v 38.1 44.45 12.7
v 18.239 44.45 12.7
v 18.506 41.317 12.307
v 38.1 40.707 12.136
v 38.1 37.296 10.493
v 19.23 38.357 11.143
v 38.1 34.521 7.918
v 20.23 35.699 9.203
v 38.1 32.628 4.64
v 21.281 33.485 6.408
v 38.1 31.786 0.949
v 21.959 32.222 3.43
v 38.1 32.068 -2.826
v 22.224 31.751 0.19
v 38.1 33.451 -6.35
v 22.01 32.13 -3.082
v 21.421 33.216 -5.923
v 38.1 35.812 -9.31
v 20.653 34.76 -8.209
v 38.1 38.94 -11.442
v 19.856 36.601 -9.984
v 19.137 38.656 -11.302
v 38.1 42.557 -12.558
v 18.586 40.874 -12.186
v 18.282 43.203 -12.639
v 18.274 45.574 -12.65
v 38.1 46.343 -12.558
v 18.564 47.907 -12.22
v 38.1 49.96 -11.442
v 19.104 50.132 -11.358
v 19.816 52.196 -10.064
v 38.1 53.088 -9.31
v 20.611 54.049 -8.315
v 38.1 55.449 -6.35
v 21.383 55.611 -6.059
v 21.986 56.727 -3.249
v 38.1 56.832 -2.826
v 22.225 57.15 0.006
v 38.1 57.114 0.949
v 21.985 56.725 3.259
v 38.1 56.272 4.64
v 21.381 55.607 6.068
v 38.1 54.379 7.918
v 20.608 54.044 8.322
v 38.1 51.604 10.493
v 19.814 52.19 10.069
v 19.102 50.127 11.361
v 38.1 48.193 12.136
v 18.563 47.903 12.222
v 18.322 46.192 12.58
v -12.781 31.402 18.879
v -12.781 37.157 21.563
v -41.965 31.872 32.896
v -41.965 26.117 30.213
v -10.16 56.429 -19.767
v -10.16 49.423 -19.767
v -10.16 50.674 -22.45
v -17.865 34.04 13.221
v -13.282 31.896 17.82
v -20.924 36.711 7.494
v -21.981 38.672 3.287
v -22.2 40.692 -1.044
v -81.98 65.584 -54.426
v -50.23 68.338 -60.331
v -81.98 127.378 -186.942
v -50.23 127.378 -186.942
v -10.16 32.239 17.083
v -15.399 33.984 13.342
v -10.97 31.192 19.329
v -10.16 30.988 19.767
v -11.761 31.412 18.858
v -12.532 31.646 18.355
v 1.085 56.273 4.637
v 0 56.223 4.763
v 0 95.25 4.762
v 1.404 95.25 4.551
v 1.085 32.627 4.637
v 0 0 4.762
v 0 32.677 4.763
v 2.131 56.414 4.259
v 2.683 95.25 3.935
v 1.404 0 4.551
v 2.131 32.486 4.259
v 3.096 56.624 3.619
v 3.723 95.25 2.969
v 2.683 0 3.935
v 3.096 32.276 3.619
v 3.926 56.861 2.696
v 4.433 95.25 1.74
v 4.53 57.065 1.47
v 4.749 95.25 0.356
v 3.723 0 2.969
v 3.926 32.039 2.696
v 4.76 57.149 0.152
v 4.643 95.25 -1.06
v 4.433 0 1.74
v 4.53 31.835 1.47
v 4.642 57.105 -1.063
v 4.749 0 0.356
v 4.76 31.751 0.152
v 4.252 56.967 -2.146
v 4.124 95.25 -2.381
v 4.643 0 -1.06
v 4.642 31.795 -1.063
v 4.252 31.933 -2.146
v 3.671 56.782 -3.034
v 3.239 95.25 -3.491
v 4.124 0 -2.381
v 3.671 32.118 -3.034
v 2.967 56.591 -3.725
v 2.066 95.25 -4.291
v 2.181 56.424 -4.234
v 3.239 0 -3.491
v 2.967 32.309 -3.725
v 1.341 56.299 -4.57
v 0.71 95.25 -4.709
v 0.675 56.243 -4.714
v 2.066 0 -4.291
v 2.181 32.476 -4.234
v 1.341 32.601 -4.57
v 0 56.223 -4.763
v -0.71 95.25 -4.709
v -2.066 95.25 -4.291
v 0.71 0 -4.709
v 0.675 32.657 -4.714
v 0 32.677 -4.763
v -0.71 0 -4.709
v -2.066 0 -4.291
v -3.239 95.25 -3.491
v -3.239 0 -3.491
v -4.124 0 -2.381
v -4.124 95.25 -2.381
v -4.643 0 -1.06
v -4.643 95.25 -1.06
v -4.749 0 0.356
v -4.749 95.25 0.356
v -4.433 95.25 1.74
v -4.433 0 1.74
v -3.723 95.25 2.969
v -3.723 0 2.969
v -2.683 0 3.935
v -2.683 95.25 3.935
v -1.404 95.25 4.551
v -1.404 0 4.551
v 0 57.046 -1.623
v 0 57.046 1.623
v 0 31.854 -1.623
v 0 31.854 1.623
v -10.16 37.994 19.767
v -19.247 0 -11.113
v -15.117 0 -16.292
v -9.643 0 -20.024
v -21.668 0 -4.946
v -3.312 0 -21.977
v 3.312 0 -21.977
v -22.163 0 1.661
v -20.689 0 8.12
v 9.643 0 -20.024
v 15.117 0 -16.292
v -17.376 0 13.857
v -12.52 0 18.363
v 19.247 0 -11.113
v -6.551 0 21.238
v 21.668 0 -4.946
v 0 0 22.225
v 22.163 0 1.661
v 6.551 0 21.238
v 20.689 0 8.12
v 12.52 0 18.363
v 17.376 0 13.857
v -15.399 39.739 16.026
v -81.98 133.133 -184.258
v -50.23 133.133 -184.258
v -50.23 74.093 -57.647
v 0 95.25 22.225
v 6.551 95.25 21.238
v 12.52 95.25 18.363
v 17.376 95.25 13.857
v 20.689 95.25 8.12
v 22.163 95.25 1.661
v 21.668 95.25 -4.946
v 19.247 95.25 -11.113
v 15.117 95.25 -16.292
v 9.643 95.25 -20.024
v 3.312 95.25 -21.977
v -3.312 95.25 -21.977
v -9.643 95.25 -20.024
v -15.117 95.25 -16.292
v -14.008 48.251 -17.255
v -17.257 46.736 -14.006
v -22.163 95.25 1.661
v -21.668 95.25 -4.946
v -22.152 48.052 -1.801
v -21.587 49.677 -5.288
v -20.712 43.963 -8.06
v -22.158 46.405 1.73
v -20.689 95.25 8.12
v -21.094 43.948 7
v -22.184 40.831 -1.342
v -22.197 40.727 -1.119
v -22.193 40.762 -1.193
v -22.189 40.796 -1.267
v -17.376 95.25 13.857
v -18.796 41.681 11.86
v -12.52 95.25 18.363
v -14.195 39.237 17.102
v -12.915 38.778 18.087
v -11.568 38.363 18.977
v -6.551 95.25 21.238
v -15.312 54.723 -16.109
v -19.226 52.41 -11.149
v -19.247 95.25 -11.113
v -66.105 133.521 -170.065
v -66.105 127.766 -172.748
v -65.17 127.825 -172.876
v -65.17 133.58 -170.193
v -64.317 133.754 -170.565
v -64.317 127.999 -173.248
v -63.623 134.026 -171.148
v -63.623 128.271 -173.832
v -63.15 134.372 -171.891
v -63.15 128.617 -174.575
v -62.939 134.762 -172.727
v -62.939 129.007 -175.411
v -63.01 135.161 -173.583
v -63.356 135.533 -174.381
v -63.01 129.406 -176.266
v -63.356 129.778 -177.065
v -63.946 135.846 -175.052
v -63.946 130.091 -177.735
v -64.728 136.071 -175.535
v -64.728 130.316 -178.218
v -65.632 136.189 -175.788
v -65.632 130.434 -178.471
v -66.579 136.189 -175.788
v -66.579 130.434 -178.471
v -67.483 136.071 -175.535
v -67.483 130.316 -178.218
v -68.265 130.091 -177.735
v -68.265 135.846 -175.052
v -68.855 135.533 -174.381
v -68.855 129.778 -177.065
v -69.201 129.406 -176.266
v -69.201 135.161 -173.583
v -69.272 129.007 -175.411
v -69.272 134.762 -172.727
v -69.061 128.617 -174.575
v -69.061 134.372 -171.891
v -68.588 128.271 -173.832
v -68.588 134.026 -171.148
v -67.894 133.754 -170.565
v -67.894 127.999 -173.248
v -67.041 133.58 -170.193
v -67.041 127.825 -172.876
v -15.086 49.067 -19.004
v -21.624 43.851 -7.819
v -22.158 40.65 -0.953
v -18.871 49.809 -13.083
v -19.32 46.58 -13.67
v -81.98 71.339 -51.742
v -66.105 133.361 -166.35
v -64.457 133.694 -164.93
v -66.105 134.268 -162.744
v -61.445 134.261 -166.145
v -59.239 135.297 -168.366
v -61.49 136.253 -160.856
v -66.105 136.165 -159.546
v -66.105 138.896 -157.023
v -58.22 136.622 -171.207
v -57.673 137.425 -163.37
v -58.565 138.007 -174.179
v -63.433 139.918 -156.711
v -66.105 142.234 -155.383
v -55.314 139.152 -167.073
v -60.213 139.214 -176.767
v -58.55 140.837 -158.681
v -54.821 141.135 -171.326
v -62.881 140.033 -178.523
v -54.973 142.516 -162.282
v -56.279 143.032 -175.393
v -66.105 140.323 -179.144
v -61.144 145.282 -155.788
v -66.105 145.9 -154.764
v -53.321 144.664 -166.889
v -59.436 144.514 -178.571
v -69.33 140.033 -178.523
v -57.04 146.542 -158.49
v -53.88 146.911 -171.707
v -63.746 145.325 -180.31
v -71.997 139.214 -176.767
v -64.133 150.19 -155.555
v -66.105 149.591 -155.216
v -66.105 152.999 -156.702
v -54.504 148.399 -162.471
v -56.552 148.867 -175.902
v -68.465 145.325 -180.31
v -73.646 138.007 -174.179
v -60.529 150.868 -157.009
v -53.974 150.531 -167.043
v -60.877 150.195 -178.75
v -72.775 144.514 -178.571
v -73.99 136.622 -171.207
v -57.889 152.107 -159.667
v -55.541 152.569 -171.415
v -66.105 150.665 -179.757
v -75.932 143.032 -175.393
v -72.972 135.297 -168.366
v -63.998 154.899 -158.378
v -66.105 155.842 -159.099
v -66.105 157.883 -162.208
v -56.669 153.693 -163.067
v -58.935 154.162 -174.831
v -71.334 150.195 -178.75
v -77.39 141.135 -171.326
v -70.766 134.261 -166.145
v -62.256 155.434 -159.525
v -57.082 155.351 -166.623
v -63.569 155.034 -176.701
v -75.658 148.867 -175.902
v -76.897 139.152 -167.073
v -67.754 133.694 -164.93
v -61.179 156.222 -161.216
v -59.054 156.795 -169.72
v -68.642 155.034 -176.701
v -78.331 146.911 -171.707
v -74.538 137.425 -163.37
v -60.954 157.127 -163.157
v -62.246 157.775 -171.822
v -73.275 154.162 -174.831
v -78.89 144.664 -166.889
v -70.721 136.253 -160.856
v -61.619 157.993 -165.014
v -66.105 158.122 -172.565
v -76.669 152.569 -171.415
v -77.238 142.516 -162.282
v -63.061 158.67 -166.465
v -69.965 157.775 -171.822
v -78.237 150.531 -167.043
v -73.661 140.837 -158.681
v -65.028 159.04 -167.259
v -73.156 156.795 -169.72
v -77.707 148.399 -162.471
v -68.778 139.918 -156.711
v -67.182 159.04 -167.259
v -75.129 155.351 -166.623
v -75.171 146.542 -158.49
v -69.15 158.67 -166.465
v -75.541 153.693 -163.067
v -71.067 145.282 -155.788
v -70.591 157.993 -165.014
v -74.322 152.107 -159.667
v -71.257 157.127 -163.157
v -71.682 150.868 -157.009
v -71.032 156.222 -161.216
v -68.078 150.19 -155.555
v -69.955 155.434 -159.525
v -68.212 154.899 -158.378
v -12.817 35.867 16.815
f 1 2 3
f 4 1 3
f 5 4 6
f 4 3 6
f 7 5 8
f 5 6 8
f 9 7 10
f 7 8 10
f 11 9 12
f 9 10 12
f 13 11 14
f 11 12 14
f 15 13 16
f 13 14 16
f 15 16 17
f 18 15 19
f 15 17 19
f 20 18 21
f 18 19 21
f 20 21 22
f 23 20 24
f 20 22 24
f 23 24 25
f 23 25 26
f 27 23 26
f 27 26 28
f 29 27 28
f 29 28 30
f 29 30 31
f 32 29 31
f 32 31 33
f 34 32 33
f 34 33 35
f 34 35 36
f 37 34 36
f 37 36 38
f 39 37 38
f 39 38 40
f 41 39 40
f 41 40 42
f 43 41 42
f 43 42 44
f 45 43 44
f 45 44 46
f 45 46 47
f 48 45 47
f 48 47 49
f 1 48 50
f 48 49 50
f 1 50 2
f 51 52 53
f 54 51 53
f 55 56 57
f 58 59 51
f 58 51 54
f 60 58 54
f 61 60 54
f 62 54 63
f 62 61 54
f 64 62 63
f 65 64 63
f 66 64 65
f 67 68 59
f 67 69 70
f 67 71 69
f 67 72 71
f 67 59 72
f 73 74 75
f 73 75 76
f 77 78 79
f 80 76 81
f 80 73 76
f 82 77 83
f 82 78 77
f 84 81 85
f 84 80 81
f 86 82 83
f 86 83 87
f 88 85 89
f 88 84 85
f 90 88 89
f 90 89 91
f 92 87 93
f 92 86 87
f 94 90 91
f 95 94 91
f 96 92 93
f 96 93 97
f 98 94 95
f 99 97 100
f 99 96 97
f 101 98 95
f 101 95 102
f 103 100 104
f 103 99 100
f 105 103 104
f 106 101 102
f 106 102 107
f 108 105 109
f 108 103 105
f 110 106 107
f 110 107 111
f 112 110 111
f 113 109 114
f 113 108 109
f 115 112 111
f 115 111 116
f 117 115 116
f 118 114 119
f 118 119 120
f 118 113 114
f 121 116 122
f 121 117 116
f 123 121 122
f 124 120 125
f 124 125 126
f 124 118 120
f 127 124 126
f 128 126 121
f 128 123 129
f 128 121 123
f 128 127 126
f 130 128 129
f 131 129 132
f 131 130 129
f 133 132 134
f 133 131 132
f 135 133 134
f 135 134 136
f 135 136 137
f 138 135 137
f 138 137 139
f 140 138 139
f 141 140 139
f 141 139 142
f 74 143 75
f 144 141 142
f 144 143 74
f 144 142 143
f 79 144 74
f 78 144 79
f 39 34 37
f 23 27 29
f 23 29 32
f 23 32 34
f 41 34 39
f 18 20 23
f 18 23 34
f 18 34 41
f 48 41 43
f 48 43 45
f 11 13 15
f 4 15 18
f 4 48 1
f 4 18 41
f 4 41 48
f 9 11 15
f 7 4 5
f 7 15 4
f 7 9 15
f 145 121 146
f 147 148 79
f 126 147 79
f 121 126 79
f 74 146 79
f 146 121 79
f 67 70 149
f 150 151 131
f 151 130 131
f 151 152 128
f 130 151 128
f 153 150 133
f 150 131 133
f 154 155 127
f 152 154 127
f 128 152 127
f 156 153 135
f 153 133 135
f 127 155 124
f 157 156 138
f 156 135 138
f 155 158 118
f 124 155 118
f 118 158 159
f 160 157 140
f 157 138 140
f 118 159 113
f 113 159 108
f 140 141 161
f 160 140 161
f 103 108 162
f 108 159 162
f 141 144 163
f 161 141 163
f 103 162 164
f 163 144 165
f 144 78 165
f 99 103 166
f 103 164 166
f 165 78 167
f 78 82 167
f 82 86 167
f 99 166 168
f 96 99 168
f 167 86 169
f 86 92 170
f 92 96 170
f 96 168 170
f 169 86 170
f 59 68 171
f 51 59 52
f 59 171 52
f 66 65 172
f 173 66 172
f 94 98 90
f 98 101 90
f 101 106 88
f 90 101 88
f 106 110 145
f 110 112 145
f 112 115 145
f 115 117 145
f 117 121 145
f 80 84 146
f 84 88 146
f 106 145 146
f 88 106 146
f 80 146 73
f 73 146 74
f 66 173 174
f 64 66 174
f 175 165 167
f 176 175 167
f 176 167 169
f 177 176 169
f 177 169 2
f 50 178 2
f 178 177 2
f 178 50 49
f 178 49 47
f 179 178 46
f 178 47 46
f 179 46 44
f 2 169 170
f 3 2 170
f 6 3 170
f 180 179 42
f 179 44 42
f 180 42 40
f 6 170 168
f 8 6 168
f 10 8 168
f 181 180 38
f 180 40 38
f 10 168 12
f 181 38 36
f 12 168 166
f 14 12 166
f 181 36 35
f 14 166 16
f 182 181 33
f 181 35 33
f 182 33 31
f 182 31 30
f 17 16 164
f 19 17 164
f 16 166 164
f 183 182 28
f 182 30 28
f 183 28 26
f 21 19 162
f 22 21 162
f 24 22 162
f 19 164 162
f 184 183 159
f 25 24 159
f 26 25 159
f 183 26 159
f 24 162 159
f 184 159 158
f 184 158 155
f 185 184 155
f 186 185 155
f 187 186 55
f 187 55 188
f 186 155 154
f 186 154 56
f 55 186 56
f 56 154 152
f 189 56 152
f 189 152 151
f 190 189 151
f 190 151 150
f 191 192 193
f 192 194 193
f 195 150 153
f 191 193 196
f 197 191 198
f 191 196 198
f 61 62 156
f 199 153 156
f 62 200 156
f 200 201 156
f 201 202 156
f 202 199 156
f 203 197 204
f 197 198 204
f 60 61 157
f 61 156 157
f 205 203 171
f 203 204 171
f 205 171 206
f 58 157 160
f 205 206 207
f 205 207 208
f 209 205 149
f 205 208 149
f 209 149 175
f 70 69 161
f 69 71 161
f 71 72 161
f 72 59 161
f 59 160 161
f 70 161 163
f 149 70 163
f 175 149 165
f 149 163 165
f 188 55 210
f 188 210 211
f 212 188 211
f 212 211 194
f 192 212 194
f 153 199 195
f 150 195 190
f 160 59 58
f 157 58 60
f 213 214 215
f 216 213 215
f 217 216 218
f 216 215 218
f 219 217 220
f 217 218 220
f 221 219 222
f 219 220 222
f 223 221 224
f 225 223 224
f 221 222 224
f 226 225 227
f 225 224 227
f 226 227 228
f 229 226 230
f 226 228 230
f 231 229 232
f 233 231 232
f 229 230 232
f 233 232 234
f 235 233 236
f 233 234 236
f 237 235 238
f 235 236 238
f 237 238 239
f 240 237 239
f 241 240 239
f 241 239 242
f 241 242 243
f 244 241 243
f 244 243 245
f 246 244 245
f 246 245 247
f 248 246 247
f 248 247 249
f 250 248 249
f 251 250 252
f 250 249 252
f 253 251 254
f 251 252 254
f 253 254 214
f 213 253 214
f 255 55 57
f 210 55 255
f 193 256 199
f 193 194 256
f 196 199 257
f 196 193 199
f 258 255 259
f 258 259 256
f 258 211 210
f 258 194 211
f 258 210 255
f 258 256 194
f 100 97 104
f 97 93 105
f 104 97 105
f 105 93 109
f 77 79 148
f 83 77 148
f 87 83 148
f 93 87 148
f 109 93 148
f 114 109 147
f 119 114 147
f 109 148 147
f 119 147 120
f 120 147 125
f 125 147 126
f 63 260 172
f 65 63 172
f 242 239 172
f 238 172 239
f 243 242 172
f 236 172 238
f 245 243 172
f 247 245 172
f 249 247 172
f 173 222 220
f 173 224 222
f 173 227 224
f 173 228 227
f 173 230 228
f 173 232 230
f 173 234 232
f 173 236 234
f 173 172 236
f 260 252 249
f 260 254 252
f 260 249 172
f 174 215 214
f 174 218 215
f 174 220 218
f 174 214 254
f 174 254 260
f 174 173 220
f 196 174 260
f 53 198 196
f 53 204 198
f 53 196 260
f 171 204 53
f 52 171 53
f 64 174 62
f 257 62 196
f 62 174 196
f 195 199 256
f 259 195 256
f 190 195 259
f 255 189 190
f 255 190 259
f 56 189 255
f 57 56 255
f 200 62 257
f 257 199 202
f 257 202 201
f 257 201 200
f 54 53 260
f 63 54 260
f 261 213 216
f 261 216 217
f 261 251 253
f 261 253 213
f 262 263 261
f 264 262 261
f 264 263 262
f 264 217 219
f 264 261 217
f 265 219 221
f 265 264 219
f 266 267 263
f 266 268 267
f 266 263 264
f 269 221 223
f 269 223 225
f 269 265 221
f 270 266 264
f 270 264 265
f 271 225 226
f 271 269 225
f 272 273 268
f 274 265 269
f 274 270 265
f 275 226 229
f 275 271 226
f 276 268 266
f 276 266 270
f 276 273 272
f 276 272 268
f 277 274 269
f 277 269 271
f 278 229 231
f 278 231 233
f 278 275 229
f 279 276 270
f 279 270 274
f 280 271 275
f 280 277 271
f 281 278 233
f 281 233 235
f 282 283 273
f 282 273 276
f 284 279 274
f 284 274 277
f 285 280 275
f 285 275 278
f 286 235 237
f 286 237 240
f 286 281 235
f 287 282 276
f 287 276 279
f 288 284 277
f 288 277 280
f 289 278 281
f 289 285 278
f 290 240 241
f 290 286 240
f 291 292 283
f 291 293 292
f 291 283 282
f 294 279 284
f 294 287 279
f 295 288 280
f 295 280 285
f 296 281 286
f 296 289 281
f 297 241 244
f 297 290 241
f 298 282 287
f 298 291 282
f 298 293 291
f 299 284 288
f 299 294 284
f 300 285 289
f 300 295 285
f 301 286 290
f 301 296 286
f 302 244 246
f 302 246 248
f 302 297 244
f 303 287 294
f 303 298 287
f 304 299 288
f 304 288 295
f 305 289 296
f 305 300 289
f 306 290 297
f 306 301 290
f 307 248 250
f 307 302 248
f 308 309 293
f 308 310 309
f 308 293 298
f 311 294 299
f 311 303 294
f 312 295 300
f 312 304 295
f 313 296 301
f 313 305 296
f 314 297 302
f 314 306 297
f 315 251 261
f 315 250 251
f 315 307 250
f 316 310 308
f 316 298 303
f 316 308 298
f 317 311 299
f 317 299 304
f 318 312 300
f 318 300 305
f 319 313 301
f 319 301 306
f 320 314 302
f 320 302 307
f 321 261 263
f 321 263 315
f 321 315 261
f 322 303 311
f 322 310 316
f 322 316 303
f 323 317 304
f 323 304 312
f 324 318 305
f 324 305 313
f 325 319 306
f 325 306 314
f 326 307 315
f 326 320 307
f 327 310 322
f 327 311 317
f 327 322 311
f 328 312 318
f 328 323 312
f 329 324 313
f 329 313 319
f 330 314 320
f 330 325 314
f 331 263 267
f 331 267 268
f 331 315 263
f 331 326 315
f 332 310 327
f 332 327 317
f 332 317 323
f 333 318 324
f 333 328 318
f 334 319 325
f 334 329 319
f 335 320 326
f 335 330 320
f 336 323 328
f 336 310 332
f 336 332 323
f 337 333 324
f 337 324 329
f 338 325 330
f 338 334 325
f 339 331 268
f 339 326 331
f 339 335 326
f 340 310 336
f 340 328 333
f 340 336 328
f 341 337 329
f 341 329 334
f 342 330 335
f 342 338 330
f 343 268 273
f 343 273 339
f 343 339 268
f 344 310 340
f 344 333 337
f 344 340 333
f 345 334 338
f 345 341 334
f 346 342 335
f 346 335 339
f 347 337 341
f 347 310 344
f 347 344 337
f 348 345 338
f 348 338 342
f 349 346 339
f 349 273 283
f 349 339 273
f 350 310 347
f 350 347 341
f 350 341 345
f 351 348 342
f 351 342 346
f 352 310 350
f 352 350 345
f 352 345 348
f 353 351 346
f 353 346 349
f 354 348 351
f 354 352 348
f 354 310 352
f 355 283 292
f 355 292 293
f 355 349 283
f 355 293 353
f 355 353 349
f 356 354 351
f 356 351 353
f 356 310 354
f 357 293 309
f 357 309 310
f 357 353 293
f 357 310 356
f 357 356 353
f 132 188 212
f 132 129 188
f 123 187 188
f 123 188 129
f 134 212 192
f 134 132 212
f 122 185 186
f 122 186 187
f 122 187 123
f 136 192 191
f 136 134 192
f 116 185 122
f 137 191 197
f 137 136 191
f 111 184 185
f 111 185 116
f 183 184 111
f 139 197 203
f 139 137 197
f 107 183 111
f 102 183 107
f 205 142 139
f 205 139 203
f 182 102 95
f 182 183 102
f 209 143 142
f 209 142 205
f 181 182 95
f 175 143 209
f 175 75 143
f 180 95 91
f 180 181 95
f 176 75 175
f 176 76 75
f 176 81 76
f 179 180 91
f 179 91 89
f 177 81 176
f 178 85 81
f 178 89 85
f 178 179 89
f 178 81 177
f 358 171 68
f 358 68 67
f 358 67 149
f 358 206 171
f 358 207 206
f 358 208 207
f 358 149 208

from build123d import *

# Parameters (mm, degrees)
SKETCH1_R           = 22.225
SKETCH1_R_2         = 4.7625
BOSS_EXTRUDE1_DEPTH = 95.25
SKETCH2_R           = 12.7
BOSS_EXTRUDE2_DEPTH = 38.1
BOSS_EXTRUDE3_START = -10.16
BOSS_EXTRUDE3_DEPTH = 101.6
CUT_EXTRUDE1_DEPTH  = 6.35
SKETCH5_R           = 3.175
BOSS_EXTRUDE4_DEPTH = 6.35
DOME1_FACE_RADIUS   = 3.175
DOME1_HEIGHT        = 25.4


with BuildPart() as part:
    # Sketch1 → Boss-Extrude1 (new body)
    with BuildSketch(Plane(origin=(0, 0, 0), x_dir=(1, 0, 0), z_dir=(0, 1, 0))):
        with Locations(Location((0, 0, 0), (0, 0, 270))):
            Circle(SKETCH1_R)
        with Locations(Location((0, 0, 0), (0, 0, 270))):
            Circle(SKETCH1_R_2, mode=Mode.SUBTRACT)
    extrude(amount=BOSS_EXTRUDE1_DEPTH)

    # Sketch2 → Boss-Extrude2 (add)
    with BuildSketch(Plane(origin=(0, 0, 0), x_dir=(0, 0, -1), z_dir=(1, 0, 0))):
        with Locations(Location((0, 44.45, 0), (0, 0, 180))):
            Circle(SKETCH2_R)
    extrude(amount=BOSS_EXTRUDE2_DEPTH)

    # Sketch3 → Boss-Extrude3 (add)
    with BuildSketch(Plane(origin=(0, 0, 0), x_dir=(0, 0, -1), z_dir=(1, 0, 0)).offset(BOSS_EXTRUDE3_START)):
        Polygon((-34.433625962, 31.155054448), (-31.75, 25.4), (186.942069012, 127.377786558), (184.25844305, 133.132841006), align=None)
    extrude(amount=-BOSS_EXTRUDE3_DEPTH)

    # Sketch4 → Cut-Extrude1 (cut)
    with BuildSketch(Plane(origin=(0, 38.779412625, 18.083137086), x_dir=(1, 0, 0), z_dir=(0, 0.9063077870366493, 0.42261826174070105))):
        with BuildLine():
            Line((-41.964599748, -16.344444393), (-81.980400092, 77.043433422))
            Line((-81.980400092, 77.043433422), (-81.980400092, 223.25923161))
            Line((-81.980400092, 223.25923161), (-111.76, 223.25923161))
            Line((-111.76, 223.25923161), (-111.76, -18.04076839))
            Line((-111.76, -18.04076839), (-10.16, -18.04076839))
            Line((-10.16, -18.04076839), (-10.16, -1.857678602))
            add(Edge.make_bspline(
                [(-15.398693032, 2.269861536), (-13.053103619, -0.216913648), (-10.16, -1.857678602)],
                knots=[5.477258717, 5.477258717, 5.477258717, 5.808405234, 5.808405234, 5.808405234], degree=2, weights=[0.860760797, 0.917991521, 1]))
            Line((-15.398693032, 2.269861536), (-12.78088793, -3.839506786))
            Line((-12.78088793, -3.839506786), (-41.964599748, -16.344444393))
        make_face()
        with BuildLine():
            Line((-10.16, 223.25923161), (-50.230400092, 223.25923161))
            Line((-50.230400092, 223.25923161), (-50.230400092, 83.55923161))
            Line((-50.230400092, 83.55923161), (-22.157554012, 18.043522888))
            add(Edge.make_bspline(
                [(-10.16, 41.762746934), (-23.308412463, 34.30589187), (-22.157554012, 18.043522888)],
                knots=[3.616372727, 3.616372727, 3.616372727, 4.782388845, 4.782388845, 4.782388845], degree=2, weights=[1, 0.711235953, 0.729678603]))
            Line((-10.16, 41.762746934), (-10.16, 223.25923161))
        make_face()
    extrude(amount=-CUT_EXTRUDE1_DEPTH, mode=Mode.SUBTRACT)

    # Sketch5 → Boss-Extrude4 (add)
    with BuildSketch(Plane(origin=(0, 38.779412625, 18.083137086), x_dir=(1, 0, 0), z_dir=(0, 0.906307787036649, 0.4226182617407014))):
        with Locations(Location((-66.105400092, 213.73423161, 0), (0, 0, 270))):
            Circle(SKETCH5_R)
    extrude(amount=BOSS_EXTRUDE4_DEPTH)

    # Dome1: a dome of height H over a round flat face of radius A is a cap of a sphere of radius (A * A + H * H) / (2 * H)
    dome1_r = (DOME1_FACE_RADIUS * DOME1_FACE_RADIUS + DOME1_HEIGHT * DOME1_HEIGHT) / (2 * DOME1_HEIGHT)
    dome1_base = Plane((-66.105400092, 134.86245651, -172.942235416), z_dir=(0, 0.906307787037, 0.422618261741))
    with Locations(dome1_base.offset(DOME1_HEIGHT - dome1_r)):
        dome1_ball = Sphere(dome1_r, mode=Mode.PRIVATE)
    add(split(dome1_ball, bisect_by=dome1_base, keep=Keep.TOP, mode=Mode.PRIVATE))


solid = part.part
